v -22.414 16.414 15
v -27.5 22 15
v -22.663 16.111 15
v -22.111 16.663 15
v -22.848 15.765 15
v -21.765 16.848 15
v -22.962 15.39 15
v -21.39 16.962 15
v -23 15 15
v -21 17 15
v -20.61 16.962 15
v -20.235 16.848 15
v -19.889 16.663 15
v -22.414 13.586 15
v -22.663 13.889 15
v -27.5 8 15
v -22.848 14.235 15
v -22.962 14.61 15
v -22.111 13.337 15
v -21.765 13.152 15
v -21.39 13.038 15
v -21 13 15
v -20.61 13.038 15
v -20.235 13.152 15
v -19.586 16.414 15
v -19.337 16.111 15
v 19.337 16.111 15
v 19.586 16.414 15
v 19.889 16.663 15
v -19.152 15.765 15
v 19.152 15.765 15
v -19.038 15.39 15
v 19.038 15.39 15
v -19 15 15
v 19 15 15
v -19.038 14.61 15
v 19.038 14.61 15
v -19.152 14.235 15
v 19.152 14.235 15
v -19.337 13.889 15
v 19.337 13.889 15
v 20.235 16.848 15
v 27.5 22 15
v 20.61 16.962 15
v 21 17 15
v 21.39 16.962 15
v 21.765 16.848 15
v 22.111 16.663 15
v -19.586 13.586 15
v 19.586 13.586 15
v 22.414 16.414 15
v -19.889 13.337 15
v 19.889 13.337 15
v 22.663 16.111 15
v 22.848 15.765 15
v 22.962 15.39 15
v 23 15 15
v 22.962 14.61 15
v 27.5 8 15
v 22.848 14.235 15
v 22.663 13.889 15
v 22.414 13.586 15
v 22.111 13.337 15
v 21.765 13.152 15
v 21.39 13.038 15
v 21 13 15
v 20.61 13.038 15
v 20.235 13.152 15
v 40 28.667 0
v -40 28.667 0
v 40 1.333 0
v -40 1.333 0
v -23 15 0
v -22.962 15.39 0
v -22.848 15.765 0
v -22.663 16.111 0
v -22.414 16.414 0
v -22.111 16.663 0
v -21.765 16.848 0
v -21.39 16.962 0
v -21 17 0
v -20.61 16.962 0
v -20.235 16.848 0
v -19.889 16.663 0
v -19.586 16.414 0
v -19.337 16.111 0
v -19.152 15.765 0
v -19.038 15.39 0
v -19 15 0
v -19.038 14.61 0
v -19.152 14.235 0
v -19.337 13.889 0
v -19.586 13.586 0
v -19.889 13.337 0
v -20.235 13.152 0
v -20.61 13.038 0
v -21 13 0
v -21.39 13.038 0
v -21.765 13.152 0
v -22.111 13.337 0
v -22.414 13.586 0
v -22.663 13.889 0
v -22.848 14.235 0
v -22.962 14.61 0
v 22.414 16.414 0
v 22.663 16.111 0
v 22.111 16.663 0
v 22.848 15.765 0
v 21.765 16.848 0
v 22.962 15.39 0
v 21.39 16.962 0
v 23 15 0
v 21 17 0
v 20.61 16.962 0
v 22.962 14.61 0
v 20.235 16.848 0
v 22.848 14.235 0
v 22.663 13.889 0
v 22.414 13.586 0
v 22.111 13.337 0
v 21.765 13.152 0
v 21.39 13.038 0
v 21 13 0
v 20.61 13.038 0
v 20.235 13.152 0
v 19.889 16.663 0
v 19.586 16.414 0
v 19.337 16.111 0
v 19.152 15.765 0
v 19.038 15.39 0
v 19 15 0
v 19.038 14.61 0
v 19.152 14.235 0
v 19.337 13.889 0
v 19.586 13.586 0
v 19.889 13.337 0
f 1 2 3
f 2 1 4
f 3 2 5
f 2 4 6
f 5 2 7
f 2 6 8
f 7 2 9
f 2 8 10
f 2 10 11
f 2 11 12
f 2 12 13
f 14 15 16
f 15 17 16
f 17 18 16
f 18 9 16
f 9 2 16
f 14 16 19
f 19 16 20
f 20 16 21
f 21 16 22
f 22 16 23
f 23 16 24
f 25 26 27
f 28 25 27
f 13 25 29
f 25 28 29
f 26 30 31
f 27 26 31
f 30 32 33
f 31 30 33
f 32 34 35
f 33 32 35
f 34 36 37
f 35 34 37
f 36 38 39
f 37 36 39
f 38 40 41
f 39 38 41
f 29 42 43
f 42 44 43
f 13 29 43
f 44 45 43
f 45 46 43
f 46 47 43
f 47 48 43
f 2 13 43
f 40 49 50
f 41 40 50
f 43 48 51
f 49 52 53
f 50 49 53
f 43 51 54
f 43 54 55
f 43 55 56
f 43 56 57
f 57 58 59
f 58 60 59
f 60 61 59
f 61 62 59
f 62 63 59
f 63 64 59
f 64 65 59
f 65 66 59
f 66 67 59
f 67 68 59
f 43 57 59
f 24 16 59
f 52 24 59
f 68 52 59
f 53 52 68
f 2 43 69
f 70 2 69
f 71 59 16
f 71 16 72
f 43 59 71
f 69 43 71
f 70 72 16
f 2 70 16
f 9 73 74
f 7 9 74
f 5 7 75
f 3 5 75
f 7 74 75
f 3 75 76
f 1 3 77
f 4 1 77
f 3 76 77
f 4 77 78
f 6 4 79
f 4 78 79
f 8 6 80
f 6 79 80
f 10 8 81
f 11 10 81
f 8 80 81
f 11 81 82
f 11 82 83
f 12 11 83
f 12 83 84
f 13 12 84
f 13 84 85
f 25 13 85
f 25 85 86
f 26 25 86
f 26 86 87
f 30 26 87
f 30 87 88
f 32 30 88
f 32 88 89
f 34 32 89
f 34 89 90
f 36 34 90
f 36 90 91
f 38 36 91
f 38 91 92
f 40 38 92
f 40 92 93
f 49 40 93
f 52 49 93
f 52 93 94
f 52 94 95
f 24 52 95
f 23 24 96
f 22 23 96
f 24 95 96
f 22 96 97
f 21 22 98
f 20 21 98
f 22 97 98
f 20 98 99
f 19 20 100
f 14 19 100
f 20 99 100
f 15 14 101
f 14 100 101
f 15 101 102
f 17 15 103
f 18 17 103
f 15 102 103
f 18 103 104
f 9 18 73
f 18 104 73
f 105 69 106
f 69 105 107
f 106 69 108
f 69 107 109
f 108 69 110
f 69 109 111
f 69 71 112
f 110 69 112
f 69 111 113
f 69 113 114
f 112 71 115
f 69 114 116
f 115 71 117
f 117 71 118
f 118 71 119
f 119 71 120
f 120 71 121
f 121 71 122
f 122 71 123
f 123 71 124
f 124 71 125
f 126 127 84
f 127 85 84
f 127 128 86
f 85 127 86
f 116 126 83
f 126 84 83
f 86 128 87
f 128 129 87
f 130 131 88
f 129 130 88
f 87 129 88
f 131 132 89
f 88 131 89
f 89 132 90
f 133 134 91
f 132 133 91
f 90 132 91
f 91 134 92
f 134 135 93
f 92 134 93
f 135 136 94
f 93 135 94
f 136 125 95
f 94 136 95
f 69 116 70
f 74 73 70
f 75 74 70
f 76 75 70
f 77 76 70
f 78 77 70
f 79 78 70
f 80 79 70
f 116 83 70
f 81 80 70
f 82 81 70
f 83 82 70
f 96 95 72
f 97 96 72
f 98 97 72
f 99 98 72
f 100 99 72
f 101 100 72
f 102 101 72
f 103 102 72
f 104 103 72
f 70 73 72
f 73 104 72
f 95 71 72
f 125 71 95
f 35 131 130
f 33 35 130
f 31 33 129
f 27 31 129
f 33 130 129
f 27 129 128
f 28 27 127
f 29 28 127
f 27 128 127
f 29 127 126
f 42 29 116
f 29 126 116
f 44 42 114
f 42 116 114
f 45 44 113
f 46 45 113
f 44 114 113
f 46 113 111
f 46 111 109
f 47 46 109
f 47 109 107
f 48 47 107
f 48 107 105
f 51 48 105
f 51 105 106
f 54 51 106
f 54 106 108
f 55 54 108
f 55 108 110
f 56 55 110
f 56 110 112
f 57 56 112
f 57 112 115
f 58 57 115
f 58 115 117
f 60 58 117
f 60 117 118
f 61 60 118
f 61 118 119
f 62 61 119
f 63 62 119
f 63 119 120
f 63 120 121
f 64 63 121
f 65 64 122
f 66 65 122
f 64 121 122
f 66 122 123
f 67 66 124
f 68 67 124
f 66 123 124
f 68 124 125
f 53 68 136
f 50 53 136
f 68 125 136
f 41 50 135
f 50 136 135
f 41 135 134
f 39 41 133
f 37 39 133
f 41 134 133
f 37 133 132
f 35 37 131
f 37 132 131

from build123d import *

# Parameters (mm, degrees)
DODANIE_WYCI_GNI_CIE1_DEPTH = 30
WYTNIJ_WYCI_GNI_CIE1_REACH  = 54.202
SZKIC2_R                    = 2
SFAZOWANIE1_SIZE            = 8
SFAZOWANIE1_SIZE_2          = 18
SFAZOWANIE2_SIZE            = 8
SFAZOWANIE2_SIZE_2          = 18


with BuildPart() as part:
    # Szkic1 → Dodanie-wyciągnięcie1 (new body)
    with BuildSketch(Plane(origin=(0, 0, 0), x_dir=(1, 0, 0), z_dir=(0, 1, 0))):
        Polygon((-40, 0), (-27.5, -15), (27.5, -15), (40, 0), align=None)
    extrude(amount=DODANIE_WYCI_GNI_CIE1_DEPTH)

    # Szkic2 → Wytnij-wyciągnięcie1 (cut, up to next)
    with BuildSketch(Plane(origin=(0, 0, 0), x_dir=(-1, 0, 0), z_dir=(0, 0, -1)), mode=Mode.PRIVATE) as wytnij_wyci_gni_cie1_sk1:
        with Locations((-21, 15)):
            Circle(SZKIC2_R)
    wytnij_wyci_gni_cie1_tool1 = extrude(wytnij_wyci_gni_cie1_sk1.sketch, amount=-WYTNIJ_WYCI_GNI_CIE1_REACH, mode=Mode.PRIVATE) & part.part
    # Szkic2 → Wytnij-wyciągnięcie1 (cut, up to next)
    with BuildSketch(Plane(origin=(0, 0, 0), x_dir=(-1, 0, 0), z_dir=(0, 0, -1)), mode=Mode.PRIVATE) as wytnij_wyci_gni_cie1_sk2:
        with Locations((21, 15)):
            Circle(SZKIC2_R)
    wytnij_wyci_gni_cie1_tool2 = extrude(wytnij_wyci_gni_cie1_sk2.sketch, amount=-WYTNIJ_WYCI_GNI_CIE1_REACH, mode=Mode.PRIVATE) & part.part
    add(wytnij_wyci_gni_cie1_tool1.solids().sort_by_distance((21, 15, 0))[0], mode=Mode.SUBTRACT)
    add(wytnij_wyci_gni_cie1_tool2.solids().sort_by_distance((-21, 15, 0))[0], mode=Mode.SUBTRACT)

    # Sfazowanie1
    # the kernel refuses this chamfer: 18, 8 mm, written as the material it takes off along each edge
    with BuildSketch(Plane(origin=(-74.15058918, 0, 15), x_dir=(0, 0.996867139056945, 0.0790942922619672), z_dir=(1, 0, 0))) as sfazowanie1_piece_1:
        Polygon((SFAZOWANIE1_SIZE * 0.996867139057, -SFAZOWANIE1_SIZE * 0.079094292262), (-SFAZOWANIE1_SIZE_2 * 0.079094292262, -SFAZOWANIE1_SIZE_2 * 0.996867139057), (0, 0), align=None)
    extrude(amount=148.301178361, mode=Mode.SUBTRACT)

    # Sfazowanie2
    # the kernel refuses this chamfer: 18, 8 mm, written as the material it takes off along each edge
    with BuildSketch(Plane(origin=(-74.15058918, 30, 15), x_dir=(0, -0.996867139056945, 0.0790942922619672), z_dir=(1, 0, 0))) as sfazowanie2_piece_1:
        Polygon((SFAZOWANIE2_SIZE * 0.996867139057, SFAZOWANIE2_SIZE * 0.079094292262), (-SFAZOWANIE2_SIZE_2 * 0.079094292262, SFAZOWANIE2_SIZE_2 * 0.996867139057), (0, 0), align=None)
    extrude(amount=148.301178361, mode=Mode.SUBTRACT)


solid = part.part
